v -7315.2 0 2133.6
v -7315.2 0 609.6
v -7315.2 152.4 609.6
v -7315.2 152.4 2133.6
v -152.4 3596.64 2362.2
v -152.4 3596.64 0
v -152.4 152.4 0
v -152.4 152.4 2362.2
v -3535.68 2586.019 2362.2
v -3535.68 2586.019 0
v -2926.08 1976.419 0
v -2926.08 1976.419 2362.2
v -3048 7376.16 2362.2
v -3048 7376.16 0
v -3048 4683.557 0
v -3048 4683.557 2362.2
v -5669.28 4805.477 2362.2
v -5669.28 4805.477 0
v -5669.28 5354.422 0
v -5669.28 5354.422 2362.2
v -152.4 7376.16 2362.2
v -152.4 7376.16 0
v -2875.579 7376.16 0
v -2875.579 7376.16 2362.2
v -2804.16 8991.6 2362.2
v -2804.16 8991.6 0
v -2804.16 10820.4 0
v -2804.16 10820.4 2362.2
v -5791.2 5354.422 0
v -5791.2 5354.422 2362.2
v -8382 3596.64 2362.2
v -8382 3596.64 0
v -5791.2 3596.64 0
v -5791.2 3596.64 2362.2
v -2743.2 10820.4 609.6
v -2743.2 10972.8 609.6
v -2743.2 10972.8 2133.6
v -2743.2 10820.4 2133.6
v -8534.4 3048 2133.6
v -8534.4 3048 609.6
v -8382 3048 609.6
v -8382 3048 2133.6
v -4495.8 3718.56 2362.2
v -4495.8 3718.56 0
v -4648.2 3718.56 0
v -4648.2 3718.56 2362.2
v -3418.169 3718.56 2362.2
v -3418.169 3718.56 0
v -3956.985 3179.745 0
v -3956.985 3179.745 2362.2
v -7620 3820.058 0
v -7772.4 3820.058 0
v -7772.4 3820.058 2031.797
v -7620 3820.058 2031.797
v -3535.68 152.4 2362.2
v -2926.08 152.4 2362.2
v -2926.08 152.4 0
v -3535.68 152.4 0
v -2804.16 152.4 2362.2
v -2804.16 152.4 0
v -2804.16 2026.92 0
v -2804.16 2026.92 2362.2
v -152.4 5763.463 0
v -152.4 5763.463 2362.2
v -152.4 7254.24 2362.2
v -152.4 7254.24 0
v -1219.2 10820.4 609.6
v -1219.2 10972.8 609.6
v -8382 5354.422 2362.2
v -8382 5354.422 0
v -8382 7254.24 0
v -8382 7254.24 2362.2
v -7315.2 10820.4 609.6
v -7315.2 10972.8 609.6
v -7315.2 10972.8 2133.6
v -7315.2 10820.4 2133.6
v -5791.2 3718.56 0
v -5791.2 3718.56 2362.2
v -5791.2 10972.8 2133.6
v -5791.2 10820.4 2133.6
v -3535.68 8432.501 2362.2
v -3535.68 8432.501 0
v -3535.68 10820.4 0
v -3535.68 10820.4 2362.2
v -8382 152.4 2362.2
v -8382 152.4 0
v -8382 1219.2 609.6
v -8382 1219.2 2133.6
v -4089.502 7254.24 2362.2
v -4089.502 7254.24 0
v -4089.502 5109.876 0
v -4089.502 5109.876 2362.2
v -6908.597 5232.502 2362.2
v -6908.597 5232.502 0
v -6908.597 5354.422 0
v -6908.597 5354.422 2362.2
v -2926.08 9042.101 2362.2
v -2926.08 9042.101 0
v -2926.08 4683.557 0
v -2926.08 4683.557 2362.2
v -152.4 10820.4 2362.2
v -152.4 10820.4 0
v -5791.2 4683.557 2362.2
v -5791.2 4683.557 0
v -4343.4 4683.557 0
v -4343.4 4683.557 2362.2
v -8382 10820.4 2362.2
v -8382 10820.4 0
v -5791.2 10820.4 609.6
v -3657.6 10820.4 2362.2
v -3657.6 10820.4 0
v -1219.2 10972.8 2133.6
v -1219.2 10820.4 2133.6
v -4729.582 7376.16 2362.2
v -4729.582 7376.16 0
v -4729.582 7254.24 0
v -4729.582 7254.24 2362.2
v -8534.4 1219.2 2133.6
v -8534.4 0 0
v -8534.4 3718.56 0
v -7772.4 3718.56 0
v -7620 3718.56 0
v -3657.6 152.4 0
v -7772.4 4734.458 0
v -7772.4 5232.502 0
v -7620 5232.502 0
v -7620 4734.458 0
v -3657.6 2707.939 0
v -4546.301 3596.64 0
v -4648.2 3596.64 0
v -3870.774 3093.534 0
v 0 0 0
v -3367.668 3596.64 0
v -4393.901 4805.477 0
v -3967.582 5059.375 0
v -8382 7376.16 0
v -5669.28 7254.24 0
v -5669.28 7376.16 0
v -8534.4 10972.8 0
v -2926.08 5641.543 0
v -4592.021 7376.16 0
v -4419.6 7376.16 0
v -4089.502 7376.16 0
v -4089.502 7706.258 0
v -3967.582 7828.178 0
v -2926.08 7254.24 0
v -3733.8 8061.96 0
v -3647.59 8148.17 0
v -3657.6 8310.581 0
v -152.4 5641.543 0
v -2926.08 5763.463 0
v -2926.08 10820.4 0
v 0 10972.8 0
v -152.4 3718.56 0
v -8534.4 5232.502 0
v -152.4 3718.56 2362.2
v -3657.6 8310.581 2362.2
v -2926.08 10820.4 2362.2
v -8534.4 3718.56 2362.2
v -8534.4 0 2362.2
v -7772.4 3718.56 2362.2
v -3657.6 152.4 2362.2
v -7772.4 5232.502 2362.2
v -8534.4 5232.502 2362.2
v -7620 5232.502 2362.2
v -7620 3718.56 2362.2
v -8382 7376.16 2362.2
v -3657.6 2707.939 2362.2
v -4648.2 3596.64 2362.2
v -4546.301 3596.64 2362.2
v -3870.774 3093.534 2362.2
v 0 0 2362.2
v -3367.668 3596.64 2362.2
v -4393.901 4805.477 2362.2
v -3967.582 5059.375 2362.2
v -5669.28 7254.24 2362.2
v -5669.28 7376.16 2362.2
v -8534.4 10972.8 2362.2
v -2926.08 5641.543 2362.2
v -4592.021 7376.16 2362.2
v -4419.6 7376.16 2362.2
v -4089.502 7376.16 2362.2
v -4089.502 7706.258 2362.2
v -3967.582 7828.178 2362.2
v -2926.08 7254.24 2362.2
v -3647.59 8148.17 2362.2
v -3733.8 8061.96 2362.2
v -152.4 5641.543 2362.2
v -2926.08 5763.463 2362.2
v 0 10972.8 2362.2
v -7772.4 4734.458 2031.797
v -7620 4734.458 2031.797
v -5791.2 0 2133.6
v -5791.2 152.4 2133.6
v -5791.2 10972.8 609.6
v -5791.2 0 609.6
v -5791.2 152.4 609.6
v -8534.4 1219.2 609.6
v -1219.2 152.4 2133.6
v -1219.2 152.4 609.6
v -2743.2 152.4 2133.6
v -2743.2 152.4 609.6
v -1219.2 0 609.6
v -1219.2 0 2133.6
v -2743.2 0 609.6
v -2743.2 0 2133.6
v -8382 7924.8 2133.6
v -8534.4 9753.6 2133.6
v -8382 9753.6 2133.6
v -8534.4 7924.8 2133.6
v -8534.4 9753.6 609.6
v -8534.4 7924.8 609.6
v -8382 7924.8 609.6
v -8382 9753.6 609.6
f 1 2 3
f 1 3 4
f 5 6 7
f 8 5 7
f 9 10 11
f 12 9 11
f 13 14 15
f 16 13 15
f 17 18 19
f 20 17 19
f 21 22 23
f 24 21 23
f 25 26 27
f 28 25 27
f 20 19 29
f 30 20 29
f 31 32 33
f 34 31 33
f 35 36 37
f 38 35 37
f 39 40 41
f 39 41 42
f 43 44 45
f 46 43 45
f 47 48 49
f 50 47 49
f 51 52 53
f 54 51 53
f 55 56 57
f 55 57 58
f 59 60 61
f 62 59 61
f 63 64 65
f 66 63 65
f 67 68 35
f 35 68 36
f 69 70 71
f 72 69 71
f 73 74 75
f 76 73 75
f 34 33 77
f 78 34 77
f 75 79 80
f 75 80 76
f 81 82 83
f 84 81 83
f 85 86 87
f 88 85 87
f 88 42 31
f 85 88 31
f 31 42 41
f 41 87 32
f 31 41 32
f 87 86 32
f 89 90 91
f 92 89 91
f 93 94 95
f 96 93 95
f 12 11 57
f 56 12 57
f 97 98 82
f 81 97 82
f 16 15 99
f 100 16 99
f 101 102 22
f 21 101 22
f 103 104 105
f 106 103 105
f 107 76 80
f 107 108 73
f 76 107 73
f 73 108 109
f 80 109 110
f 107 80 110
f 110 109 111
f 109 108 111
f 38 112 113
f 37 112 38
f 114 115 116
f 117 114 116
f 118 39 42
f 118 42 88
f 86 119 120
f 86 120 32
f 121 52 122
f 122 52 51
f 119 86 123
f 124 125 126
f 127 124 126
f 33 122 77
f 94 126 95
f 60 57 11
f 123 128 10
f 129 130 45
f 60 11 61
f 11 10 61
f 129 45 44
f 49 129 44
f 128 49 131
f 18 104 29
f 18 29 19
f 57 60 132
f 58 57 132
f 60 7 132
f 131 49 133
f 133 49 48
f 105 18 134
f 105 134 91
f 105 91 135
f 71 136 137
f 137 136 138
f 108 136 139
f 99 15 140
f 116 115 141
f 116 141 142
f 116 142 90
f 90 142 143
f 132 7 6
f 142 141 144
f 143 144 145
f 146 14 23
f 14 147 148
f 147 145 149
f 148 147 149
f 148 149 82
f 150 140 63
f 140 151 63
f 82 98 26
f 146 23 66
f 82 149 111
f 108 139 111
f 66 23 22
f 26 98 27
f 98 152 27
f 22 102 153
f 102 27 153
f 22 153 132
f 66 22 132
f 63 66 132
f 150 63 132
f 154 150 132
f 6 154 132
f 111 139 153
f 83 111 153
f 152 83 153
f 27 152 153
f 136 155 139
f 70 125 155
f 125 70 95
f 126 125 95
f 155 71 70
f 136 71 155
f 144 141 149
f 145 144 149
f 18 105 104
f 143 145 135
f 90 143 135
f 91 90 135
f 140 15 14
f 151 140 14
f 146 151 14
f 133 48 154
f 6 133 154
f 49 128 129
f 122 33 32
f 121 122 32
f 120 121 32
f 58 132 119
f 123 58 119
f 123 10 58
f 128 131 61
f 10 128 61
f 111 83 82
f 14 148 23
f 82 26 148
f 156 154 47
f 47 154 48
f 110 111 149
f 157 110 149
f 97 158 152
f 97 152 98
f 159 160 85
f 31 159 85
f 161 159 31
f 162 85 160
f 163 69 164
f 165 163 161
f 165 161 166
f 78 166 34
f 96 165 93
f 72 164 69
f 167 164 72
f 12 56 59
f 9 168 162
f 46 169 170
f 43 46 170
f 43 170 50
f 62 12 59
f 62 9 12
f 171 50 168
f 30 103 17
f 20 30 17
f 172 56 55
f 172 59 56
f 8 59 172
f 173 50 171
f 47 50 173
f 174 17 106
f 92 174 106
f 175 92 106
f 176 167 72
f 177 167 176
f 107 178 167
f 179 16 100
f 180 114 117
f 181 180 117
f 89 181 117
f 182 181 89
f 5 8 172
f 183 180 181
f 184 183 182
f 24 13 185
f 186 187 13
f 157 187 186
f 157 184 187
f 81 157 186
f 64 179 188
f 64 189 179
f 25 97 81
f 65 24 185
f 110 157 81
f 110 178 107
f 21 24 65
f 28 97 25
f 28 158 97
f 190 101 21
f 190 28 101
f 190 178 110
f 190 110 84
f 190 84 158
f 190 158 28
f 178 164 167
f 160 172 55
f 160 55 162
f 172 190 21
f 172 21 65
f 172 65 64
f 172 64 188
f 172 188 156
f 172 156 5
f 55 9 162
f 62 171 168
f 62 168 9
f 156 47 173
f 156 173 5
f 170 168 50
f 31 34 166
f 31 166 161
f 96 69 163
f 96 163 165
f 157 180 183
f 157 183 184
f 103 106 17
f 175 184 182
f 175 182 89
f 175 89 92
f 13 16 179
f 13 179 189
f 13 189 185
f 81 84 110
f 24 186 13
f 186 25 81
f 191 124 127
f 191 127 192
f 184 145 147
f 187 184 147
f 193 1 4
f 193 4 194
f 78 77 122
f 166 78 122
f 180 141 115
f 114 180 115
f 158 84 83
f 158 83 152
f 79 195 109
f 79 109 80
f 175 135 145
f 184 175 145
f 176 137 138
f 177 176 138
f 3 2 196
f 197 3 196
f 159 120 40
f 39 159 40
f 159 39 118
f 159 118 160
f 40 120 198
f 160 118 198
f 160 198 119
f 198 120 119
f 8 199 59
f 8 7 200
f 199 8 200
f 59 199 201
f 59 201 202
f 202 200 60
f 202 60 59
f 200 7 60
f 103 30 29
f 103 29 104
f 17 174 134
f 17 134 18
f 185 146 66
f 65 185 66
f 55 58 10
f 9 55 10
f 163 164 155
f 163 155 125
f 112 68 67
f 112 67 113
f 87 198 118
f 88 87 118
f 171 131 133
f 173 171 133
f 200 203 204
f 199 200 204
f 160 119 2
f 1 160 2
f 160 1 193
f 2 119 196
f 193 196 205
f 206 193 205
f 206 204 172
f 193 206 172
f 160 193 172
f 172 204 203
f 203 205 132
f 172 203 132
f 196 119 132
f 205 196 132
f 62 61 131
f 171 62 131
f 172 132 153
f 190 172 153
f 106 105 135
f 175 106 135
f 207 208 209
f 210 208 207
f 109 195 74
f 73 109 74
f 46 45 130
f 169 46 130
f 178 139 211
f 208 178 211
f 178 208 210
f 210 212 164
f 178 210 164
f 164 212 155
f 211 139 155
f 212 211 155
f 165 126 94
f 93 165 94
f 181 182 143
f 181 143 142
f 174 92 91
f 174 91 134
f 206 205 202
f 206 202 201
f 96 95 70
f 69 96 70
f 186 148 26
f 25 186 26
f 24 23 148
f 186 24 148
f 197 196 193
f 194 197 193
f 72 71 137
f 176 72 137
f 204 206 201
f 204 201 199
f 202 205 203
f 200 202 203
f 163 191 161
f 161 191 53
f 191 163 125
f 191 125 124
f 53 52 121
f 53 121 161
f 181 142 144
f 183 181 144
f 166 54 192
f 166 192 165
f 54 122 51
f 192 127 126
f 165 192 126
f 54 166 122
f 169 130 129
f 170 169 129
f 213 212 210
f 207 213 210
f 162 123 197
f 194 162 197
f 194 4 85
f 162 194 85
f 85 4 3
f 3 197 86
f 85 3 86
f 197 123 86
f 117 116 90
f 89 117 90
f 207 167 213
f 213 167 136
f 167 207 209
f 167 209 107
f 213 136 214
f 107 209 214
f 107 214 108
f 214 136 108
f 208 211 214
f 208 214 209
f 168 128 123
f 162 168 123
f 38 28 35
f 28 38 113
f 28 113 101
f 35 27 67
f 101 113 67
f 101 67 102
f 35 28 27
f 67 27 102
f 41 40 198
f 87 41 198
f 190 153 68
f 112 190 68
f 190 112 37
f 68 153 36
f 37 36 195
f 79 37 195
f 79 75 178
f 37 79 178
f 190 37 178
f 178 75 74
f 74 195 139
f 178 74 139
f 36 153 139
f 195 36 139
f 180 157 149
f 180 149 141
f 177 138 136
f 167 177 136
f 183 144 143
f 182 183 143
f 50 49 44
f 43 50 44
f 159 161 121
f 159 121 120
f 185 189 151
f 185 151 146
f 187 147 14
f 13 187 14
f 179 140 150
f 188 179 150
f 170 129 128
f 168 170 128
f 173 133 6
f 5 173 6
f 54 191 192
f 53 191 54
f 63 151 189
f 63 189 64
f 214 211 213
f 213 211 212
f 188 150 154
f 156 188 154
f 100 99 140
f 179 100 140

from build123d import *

# Parameters (mm, degrees)
F0_W     = 2773.68
F0_H     = 1490.7768
F1_DEPTH = 2362.2
F2_W     = 1524
F2_H     = 1524
F3_DEPTH = 152.4
F4_W     = 1828.8
F4_H     = 1524
F5_DEPTH = 152.4
F6_W     = 914.4
F6_H     = 2031.7968
F7_DEPTH = 152.4
F8_W     = 1524
F8_H     = 1524
F9_DEPTH = 152.4


with BuildPart() as f1:
    # F0 (on Top) → F1 (new body)
    with BuildSketch(Plane.XY):
        Polygon((0, 10972.8), (-8534.4, 10972.8), (-8534.4, 5232.5016), (-7772.4, 5232.5016), (-7772.4, 3718.56), (-8534.4, 3718.56), (-8534.4, 0), (0, 0), (0, 3718.56), align=None)
        Polygon((-2926.08, 152.4), (-3535.68, 152.4), (-3535.68, 2586.019082), (-2926.08, 1976.419082), align=None, mode=Mode.SUBTRACT)
        Polygon((-2804.16, 2026.92), (-3870.774174, 3093.534174), (-3367.668348, 3596.64), (-152.4, 3596.64), (-152.4, 152.4), (-2804.16, 152.4), align=None, mode=Mode.SUBTRACT)
        Polygon((-152.4, 5641.5432), (-152.4, 3718.56), (-3418.169265, 3718.56), (-3956.984633, 3179.744633), (-4495.8, 3718.56), (-4648.2, 3718.56), (-4648.2, 3596.64), (-4546.300918, 3596.64), (-3657.6, 2707.939082), (-3657.6, 152.4), (-8382, 152.4), (-8382, 3596.64), (-5791.2, 3596.64), (-5791.2, 3718.56), (-7620, 3718.56), (-7620, 5232.5016), (-6908.5968, 5232.5016), (-6908.5968, 5354.4216), (-8382, 5354.4216), (-8382, 7254.24), (-5669.28, 7254.24), (-5669.28, 7376.16), (-8382, 7376.16), (-8382, 10820.4), (-3657.6, 10820.4), (-3657.6, 8310.580918), (-4134.9168, 7833.264118), (-4592.020918, 7376.16), (-4729.5816, 7376.16), (-4729.5816, 7254.24), (-4648.295882, 7254.24), (-4089.5016, 7254.24), (-4089.5016, 5109.876118), (-4393.900918, 4805.4768), (-5669.28, 4805.4768), (-5669.28, 5354.4216), (-5791.2, 5354.4216), (-5791.2, 4683.5568), (-4343.4, 4683.5568), (-3967.5816, 5059.3752), (-3967.5816, 7828.1784), (-3733.8, 8061.96), (-3048, 7376.16), (-3048, 5641.5432), (-3048, 4683.5568), (-2926.08, 4683.5568), (-2926.08, 5641.5432), align=None, mode=Mode.SUBTRACT)
        Polygon((-4089.5016, 7376.16), (-4419.6, 7376.16), (-4089.5016, 7706.2584), align=None, mode=Mode.SUBTRACT)
        with Locations((-1539.24, 6508.8516)):
            Rectangle(F0_W, F0_H, mode=Mode.SUBTRACT)
        Polygon((-2926.08, 9042.100918), (-3535.68, 8432.500918), (-3535.68, 10820.4), (-2926.08, 10820.4), align=None, mode=Mode.SUBTRACT)
        Polygon((-152.4, 7376.16), (-2875.579082, 7376.16), (-3647.589541, 8148.170459), (-2804.16, 8991.6), (-2804.16, 10820.4), (-152.4, 10820.4), align=None, mode=Mode.SUBTRACT)
    extrude(amount=F1_DEPTH)

    # F2 (on face) → F3 (cut)
    with BuildSketch(Plane.XZ):
        with Locations((-6553.2, 1371.6)):
            Rectangle(F2_W, F2_H)
        with Locations((-1981.2, 1371.6)):
            Rectangle(F2_W, F2_H)
    extrude(amount=-F3_DEPTH, mode=Mode.SUBTRACT)

    # F4 (on face) → F5 (cut)
    with BuildSketch(Plane(origin=(-8534.4, 0, 0), x_dir=(0, -1, 0), z_dir=(-1, 0, 0))):
        with Locations((-8839.2, 1371.6)):
            Rectangle(F4_W, F4_H)
        with Locations((-2133.6, 1371.6)):
            Rectangle(F4_W, F4_H)
    extrude(amount=-F5_DEPTH, mode=Mode.SUBTRACT)

    # F6 (on face) → F7 (cut)
    with BuildSketch(Plane(origin=(-7772.4, 0, 0), x_dir=(0, -1, 0), z_dir=(-1, 0, 0))):
        with Locations((-4277.2584, 1015.8984)):
            Rectangle(F6_W, F6_H)
    extrude(amount=-F7_DEPTH, mode=Mode.SUBTRACT)

    # F8 (on face) → F9 (cut)
    with BuildSketch(Plane(origin=(0, 10972.8, 0), x_dir=(-1, 0, 0), z_dir=(0, 1, 0))):
        with Locations((6553.2, 1371.6)):
            Rectangle(F8_W, F8_H)
        with Locations((1981.2, 1371.6)):
            Rectangle(F8_W, F8_H)
    extrude(amount=-F9_DEPTH, mode=Mode.SUBTRACT)


solid = f1.part
